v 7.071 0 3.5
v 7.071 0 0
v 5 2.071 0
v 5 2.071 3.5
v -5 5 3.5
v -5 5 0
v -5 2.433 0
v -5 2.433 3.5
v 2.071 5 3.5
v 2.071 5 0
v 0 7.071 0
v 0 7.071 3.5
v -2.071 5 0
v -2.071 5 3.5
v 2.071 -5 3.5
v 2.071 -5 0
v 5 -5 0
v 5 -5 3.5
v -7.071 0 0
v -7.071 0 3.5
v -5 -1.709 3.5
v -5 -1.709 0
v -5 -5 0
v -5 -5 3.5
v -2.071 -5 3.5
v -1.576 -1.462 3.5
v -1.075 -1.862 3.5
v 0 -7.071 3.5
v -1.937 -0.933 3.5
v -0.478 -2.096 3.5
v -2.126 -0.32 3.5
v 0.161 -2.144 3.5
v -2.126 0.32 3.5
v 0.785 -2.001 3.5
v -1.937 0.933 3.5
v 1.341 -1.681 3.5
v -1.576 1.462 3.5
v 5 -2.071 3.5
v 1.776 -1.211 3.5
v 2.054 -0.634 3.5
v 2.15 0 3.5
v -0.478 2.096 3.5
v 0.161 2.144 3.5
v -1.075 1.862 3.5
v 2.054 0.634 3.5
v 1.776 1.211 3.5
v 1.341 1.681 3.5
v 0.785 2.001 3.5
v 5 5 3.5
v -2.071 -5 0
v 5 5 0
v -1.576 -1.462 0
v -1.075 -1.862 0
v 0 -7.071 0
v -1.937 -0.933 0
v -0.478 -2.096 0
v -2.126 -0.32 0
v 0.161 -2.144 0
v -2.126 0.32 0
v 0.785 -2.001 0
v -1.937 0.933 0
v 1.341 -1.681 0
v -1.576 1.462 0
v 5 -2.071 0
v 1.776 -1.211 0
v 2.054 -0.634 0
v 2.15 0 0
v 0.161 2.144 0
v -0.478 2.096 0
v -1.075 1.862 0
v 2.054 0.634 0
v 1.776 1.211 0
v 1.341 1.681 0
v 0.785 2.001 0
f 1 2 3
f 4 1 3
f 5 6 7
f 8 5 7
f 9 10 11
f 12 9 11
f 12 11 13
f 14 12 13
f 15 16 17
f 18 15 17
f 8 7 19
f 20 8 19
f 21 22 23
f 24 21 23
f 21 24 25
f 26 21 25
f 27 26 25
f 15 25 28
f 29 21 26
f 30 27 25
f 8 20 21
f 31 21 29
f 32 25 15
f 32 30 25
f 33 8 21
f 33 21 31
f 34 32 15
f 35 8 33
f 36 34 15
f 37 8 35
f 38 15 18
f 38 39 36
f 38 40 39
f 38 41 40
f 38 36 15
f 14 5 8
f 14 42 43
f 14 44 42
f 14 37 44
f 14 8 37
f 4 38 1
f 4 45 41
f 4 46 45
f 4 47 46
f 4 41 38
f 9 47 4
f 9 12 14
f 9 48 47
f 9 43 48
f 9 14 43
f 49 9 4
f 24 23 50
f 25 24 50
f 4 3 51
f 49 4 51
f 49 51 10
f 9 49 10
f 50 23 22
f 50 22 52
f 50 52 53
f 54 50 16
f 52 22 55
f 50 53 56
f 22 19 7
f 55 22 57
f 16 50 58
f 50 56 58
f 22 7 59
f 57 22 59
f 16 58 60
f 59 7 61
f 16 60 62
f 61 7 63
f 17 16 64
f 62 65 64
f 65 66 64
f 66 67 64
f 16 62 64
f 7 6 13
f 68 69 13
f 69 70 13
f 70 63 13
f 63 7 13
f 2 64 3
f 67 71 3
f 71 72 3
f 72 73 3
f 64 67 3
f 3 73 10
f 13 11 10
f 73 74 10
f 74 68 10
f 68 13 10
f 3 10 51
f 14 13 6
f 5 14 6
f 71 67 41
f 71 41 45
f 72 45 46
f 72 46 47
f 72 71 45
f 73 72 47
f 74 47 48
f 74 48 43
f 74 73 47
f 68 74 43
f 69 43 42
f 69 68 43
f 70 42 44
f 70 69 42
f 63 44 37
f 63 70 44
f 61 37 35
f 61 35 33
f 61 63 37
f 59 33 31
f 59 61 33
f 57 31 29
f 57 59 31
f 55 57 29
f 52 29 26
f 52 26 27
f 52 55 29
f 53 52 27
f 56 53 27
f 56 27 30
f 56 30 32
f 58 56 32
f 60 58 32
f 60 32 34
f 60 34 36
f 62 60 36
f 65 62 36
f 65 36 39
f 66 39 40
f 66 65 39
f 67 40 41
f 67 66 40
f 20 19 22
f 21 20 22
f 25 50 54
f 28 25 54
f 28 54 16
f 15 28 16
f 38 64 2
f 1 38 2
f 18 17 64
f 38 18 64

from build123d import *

# Parameters (mm, degrees)
F0_R     = 5
F0_R_2   = 2.15
F1_DEPTH = 3.5


with BuildPart() as f1:
    # F0 (on Top) → F1 (new body)
    with BuildSketch(Plane.XY):
        Polygon((-2.071068, 5), (-5, 5), (-5, 2.433351), (-7.071068, 0), (-5, -1.708784), (-5, -5), (-2.071068, -5), (0, -7.071068), (2.071068, -5), (5, -5), (5, -2.071068), (7.071068, 0), (5, 2.071068), (5, 5), (2.071068, 5), (0, 7.071068), align=None)
        Circle(F0_R, mode=Mode.SUBTRACT)
        Circle(F0_R)
        Circle(F0_R_2, mode=Mode.SUBTRACT)
    extrude(amount=F1_DEPTH)


solid = f1.part
